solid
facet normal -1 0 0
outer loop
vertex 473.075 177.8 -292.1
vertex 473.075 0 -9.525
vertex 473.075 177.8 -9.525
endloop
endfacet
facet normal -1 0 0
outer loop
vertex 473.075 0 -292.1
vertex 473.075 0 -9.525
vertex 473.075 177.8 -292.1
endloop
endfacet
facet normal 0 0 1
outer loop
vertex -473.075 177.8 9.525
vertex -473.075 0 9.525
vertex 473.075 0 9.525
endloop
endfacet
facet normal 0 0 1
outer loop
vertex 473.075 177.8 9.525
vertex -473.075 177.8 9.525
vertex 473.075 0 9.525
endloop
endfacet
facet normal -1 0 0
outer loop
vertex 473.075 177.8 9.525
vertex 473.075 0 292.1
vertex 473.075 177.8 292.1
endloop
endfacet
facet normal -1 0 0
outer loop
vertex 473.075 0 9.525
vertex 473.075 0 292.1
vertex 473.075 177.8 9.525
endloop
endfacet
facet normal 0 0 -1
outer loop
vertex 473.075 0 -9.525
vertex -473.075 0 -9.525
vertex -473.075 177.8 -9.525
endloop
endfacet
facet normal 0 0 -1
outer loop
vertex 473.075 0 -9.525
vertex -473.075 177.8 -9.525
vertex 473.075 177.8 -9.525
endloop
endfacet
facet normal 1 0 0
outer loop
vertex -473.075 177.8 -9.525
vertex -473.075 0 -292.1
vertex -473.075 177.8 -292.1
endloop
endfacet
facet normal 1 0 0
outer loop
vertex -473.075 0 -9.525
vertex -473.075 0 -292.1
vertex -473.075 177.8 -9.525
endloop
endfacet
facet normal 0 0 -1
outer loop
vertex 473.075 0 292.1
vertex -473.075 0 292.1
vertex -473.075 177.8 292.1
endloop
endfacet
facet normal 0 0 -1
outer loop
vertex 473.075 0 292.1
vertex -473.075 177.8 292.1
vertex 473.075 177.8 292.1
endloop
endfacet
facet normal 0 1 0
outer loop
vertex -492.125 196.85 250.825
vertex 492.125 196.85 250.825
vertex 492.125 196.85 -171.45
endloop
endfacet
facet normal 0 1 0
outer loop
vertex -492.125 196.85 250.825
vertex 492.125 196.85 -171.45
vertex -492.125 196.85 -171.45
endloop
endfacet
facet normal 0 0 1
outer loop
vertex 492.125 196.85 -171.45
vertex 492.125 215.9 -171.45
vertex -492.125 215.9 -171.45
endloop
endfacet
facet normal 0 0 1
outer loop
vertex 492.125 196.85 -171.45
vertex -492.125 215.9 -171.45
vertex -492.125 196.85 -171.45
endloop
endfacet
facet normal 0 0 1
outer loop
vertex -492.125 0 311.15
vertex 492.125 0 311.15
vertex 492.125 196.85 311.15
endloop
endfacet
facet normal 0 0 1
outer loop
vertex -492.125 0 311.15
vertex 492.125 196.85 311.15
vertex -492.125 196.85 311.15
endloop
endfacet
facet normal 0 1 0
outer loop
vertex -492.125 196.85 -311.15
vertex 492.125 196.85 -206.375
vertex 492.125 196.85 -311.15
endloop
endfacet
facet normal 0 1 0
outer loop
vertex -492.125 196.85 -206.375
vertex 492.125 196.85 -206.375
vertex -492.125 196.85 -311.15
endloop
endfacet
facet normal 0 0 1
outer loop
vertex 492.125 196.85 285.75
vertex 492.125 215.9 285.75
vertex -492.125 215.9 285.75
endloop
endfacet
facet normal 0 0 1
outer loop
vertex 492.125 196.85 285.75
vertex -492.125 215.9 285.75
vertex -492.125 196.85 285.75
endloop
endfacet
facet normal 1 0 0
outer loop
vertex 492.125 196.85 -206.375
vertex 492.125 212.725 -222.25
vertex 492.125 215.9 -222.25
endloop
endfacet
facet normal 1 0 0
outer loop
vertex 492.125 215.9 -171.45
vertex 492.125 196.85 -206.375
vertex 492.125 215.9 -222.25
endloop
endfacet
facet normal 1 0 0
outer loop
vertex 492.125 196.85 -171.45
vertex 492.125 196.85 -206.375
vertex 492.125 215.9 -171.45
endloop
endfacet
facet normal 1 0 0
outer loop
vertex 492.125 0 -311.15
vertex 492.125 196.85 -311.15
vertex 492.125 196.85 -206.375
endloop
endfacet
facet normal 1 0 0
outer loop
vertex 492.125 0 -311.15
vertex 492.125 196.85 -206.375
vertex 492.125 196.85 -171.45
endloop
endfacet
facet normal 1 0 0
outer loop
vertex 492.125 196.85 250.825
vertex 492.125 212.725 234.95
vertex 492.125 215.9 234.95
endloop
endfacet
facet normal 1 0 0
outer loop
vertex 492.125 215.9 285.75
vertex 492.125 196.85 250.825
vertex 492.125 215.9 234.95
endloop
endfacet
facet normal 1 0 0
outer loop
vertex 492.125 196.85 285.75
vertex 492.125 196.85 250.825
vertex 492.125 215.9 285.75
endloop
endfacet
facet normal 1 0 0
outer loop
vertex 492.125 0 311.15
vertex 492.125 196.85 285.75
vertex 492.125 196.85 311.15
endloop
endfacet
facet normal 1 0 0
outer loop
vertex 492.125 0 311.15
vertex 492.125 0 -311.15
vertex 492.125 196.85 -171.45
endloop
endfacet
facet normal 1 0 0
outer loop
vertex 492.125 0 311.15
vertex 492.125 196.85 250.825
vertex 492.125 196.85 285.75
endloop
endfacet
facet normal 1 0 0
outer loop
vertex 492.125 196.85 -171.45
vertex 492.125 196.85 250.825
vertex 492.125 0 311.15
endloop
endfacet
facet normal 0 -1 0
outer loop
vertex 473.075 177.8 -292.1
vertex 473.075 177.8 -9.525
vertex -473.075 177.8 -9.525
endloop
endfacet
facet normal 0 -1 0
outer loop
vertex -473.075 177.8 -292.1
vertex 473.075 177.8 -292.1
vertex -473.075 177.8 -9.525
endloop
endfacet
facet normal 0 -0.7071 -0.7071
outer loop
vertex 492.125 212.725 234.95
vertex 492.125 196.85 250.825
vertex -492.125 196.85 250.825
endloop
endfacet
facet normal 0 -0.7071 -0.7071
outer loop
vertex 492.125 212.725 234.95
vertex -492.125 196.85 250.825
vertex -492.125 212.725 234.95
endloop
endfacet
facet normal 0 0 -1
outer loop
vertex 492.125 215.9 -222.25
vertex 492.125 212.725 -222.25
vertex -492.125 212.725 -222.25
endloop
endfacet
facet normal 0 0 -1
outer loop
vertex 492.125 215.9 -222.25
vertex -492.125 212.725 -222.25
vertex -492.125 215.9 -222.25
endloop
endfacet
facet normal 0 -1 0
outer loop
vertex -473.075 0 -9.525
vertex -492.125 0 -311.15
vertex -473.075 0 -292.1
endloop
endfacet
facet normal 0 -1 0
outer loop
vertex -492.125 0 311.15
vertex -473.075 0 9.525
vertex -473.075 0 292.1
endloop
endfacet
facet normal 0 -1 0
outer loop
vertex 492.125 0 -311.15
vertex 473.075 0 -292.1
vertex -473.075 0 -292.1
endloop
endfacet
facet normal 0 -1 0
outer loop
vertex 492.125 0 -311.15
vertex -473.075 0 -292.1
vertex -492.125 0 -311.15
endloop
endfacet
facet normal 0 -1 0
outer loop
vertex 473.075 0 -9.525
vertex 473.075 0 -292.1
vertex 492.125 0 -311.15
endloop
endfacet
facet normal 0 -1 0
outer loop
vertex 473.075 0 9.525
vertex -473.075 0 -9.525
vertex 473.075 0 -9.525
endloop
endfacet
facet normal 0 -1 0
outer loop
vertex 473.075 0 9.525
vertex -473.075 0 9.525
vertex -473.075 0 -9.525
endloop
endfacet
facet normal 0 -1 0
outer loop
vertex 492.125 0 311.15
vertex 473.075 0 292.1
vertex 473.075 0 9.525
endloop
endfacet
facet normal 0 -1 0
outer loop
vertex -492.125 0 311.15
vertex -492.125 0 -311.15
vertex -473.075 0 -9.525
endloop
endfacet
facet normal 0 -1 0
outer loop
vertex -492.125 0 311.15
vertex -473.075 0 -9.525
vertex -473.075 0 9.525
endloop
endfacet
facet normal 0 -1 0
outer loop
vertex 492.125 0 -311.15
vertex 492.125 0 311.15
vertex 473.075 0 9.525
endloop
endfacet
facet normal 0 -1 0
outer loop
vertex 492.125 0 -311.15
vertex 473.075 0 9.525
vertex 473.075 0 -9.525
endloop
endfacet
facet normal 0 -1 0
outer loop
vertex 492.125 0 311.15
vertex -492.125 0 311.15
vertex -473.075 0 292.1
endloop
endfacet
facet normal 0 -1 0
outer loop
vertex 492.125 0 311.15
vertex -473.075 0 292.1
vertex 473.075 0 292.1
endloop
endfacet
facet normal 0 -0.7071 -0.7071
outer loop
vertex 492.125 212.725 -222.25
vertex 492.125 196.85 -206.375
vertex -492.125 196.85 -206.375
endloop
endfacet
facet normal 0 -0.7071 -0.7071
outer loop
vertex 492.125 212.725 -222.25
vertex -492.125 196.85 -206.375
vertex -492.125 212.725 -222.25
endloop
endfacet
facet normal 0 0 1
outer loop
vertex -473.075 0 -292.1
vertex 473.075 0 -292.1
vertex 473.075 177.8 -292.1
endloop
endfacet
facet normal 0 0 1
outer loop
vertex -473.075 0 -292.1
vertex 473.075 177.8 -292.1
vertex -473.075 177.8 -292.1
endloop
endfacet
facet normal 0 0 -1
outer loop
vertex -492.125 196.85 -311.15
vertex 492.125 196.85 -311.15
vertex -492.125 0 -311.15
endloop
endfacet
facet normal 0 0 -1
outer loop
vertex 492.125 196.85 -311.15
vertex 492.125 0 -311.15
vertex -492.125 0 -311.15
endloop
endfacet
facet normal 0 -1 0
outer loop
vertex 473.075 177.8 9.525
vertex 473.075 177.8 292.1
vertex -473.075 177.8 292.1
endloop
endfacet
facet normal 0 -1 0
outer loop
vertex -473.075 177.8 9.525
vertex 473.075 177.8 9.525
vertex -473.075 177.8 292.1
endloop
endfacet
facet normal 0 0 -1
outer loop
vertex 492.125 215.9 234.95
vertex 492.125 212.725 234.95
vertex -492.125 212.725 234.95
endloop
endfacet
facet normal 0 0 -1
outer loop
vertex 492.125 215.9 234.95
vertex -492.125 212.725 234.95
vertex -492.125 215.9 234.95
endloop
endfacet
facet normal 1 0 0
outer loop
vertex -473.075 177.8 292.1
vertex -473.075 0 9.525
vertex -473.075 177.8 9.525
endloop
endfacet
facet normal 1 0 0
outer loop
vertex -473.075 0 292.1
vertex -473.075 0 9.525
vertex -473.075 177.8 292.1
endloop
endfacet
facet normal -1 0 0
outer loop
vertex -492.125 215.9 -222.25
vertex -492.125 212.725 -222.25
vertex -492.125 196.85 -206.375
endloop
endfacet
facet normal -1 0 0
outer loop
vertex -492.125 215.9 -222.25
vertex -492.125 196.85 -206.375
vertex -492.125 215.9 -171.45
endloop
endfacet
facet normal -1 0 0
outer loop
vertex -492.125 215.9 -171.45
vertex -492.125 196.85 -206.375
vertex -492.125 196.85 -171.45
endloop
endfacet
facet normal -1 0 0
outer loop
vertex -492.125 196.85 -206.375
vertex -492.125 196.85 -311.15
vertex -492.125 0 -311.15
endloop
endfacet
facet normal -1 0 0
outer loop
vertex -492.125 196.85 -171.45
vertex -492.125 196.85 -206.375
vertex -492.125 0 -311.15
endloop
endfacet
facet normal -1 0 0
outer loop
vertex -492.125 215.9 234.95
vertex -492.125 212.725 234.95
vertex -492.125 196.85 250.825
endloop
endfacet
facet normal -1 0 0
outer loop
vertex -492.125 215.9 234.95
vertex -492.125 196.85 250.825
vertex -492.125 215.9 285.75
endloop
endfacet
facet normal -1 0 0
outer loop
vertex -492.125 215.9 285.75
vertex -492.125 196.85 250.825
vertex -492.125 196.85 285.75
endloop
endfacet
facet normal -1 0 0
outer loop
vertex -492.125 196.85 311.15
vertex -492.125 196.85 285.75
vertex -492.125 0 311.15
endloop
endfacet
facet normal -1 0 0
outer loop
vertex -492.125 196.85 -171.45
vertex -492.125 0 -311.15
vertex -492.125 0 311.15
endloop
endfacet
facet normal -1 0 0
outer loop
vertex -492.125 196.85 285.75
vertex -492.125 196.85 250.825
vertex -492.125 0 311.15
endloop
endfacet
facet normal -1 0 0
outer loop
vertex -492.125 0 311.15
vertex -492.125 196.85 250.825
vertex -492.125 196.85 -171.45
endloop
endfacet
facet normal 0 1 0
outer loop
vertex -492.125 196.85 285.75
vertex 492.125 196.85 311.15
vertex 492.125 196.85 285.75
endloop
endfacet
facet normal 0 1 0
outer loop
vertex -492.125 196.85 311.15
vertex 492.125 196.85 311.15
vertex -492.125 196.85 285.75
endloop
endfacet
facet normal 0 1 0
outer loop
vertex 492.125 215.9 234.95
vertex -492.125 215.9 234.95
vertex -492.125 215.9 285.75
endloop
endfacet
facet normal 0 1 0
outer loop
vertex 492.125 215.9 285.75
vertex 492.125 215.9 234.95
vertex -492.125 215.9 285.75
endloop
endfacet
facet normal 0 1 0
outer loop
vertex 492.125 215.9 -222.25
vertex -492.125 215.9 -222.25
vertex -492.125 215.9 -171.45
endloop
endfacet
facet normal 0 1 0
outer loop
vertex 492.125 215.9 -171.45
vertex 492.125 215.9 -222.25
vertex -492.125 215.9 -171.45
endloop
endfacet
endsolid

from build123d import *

# Parameters (mm, degrees)
F0_W     = 984.25
F0_H     = 622.3
F1_DEPTH = 177.8
F2_W     = 984.25
F2_H     = 622.3
F3_DEPTH = 19.05
F0_W_2   = 946.15
F0_H_2   = 19.05
F4_DEPTH = 177.8
F6_DEPTH = 984.25


with BuildPart() as f1:
    # F0 (on Front) → F1 (new body)
    with BuildSketch(Plane.XZ):
        Rectangle(F0_W, F0_H)
        Polygon((473.075, -292.1), (-473.075, -292.1), (-473.075, -9.525), (-473.075, 9.525), (-473.075, 292.1), (473.075, 292.1), (473.075, 9.525), (473.075, -9.525), align=None, mode=Mode.SUBTRACT)
    extrude(amount=-F1_DEPTH)

    # F2 (on face) → F3 (join)
    with BuildSketch(Plane(origin=(0, 177.8, 0), x_dir=(-1, 0, 0), z_dir=(0, 1, 0))):
        Rectangle(F2_W, F2_H)
    extrude(amount=F3_DEPTH)

    # F0 (on Front) → F4 (join)
    with BuildSketch(Plane.XZ):
        Rectangle(F0_W_2, F0_H_2)
    extrude(amount=-F4_DEPTH)

    # F5 (on face) → F6 (join)
    with BuildSketch(Plane.YZ.offset(492.125)):
        Polygon((215.9, 285.75), (196.85, 285.75), (196.85, 250.825), (212.725, 234.95), (215.9, 234.95), align=None)
        Polygon((215.9, -171.45), (196.85, -171.45), (196.85, -206.375), (212.725, -222.25), (215.9, -222.25), align=None)
    extrude(amount=-F6_DEPTH)


solid = f1.part
